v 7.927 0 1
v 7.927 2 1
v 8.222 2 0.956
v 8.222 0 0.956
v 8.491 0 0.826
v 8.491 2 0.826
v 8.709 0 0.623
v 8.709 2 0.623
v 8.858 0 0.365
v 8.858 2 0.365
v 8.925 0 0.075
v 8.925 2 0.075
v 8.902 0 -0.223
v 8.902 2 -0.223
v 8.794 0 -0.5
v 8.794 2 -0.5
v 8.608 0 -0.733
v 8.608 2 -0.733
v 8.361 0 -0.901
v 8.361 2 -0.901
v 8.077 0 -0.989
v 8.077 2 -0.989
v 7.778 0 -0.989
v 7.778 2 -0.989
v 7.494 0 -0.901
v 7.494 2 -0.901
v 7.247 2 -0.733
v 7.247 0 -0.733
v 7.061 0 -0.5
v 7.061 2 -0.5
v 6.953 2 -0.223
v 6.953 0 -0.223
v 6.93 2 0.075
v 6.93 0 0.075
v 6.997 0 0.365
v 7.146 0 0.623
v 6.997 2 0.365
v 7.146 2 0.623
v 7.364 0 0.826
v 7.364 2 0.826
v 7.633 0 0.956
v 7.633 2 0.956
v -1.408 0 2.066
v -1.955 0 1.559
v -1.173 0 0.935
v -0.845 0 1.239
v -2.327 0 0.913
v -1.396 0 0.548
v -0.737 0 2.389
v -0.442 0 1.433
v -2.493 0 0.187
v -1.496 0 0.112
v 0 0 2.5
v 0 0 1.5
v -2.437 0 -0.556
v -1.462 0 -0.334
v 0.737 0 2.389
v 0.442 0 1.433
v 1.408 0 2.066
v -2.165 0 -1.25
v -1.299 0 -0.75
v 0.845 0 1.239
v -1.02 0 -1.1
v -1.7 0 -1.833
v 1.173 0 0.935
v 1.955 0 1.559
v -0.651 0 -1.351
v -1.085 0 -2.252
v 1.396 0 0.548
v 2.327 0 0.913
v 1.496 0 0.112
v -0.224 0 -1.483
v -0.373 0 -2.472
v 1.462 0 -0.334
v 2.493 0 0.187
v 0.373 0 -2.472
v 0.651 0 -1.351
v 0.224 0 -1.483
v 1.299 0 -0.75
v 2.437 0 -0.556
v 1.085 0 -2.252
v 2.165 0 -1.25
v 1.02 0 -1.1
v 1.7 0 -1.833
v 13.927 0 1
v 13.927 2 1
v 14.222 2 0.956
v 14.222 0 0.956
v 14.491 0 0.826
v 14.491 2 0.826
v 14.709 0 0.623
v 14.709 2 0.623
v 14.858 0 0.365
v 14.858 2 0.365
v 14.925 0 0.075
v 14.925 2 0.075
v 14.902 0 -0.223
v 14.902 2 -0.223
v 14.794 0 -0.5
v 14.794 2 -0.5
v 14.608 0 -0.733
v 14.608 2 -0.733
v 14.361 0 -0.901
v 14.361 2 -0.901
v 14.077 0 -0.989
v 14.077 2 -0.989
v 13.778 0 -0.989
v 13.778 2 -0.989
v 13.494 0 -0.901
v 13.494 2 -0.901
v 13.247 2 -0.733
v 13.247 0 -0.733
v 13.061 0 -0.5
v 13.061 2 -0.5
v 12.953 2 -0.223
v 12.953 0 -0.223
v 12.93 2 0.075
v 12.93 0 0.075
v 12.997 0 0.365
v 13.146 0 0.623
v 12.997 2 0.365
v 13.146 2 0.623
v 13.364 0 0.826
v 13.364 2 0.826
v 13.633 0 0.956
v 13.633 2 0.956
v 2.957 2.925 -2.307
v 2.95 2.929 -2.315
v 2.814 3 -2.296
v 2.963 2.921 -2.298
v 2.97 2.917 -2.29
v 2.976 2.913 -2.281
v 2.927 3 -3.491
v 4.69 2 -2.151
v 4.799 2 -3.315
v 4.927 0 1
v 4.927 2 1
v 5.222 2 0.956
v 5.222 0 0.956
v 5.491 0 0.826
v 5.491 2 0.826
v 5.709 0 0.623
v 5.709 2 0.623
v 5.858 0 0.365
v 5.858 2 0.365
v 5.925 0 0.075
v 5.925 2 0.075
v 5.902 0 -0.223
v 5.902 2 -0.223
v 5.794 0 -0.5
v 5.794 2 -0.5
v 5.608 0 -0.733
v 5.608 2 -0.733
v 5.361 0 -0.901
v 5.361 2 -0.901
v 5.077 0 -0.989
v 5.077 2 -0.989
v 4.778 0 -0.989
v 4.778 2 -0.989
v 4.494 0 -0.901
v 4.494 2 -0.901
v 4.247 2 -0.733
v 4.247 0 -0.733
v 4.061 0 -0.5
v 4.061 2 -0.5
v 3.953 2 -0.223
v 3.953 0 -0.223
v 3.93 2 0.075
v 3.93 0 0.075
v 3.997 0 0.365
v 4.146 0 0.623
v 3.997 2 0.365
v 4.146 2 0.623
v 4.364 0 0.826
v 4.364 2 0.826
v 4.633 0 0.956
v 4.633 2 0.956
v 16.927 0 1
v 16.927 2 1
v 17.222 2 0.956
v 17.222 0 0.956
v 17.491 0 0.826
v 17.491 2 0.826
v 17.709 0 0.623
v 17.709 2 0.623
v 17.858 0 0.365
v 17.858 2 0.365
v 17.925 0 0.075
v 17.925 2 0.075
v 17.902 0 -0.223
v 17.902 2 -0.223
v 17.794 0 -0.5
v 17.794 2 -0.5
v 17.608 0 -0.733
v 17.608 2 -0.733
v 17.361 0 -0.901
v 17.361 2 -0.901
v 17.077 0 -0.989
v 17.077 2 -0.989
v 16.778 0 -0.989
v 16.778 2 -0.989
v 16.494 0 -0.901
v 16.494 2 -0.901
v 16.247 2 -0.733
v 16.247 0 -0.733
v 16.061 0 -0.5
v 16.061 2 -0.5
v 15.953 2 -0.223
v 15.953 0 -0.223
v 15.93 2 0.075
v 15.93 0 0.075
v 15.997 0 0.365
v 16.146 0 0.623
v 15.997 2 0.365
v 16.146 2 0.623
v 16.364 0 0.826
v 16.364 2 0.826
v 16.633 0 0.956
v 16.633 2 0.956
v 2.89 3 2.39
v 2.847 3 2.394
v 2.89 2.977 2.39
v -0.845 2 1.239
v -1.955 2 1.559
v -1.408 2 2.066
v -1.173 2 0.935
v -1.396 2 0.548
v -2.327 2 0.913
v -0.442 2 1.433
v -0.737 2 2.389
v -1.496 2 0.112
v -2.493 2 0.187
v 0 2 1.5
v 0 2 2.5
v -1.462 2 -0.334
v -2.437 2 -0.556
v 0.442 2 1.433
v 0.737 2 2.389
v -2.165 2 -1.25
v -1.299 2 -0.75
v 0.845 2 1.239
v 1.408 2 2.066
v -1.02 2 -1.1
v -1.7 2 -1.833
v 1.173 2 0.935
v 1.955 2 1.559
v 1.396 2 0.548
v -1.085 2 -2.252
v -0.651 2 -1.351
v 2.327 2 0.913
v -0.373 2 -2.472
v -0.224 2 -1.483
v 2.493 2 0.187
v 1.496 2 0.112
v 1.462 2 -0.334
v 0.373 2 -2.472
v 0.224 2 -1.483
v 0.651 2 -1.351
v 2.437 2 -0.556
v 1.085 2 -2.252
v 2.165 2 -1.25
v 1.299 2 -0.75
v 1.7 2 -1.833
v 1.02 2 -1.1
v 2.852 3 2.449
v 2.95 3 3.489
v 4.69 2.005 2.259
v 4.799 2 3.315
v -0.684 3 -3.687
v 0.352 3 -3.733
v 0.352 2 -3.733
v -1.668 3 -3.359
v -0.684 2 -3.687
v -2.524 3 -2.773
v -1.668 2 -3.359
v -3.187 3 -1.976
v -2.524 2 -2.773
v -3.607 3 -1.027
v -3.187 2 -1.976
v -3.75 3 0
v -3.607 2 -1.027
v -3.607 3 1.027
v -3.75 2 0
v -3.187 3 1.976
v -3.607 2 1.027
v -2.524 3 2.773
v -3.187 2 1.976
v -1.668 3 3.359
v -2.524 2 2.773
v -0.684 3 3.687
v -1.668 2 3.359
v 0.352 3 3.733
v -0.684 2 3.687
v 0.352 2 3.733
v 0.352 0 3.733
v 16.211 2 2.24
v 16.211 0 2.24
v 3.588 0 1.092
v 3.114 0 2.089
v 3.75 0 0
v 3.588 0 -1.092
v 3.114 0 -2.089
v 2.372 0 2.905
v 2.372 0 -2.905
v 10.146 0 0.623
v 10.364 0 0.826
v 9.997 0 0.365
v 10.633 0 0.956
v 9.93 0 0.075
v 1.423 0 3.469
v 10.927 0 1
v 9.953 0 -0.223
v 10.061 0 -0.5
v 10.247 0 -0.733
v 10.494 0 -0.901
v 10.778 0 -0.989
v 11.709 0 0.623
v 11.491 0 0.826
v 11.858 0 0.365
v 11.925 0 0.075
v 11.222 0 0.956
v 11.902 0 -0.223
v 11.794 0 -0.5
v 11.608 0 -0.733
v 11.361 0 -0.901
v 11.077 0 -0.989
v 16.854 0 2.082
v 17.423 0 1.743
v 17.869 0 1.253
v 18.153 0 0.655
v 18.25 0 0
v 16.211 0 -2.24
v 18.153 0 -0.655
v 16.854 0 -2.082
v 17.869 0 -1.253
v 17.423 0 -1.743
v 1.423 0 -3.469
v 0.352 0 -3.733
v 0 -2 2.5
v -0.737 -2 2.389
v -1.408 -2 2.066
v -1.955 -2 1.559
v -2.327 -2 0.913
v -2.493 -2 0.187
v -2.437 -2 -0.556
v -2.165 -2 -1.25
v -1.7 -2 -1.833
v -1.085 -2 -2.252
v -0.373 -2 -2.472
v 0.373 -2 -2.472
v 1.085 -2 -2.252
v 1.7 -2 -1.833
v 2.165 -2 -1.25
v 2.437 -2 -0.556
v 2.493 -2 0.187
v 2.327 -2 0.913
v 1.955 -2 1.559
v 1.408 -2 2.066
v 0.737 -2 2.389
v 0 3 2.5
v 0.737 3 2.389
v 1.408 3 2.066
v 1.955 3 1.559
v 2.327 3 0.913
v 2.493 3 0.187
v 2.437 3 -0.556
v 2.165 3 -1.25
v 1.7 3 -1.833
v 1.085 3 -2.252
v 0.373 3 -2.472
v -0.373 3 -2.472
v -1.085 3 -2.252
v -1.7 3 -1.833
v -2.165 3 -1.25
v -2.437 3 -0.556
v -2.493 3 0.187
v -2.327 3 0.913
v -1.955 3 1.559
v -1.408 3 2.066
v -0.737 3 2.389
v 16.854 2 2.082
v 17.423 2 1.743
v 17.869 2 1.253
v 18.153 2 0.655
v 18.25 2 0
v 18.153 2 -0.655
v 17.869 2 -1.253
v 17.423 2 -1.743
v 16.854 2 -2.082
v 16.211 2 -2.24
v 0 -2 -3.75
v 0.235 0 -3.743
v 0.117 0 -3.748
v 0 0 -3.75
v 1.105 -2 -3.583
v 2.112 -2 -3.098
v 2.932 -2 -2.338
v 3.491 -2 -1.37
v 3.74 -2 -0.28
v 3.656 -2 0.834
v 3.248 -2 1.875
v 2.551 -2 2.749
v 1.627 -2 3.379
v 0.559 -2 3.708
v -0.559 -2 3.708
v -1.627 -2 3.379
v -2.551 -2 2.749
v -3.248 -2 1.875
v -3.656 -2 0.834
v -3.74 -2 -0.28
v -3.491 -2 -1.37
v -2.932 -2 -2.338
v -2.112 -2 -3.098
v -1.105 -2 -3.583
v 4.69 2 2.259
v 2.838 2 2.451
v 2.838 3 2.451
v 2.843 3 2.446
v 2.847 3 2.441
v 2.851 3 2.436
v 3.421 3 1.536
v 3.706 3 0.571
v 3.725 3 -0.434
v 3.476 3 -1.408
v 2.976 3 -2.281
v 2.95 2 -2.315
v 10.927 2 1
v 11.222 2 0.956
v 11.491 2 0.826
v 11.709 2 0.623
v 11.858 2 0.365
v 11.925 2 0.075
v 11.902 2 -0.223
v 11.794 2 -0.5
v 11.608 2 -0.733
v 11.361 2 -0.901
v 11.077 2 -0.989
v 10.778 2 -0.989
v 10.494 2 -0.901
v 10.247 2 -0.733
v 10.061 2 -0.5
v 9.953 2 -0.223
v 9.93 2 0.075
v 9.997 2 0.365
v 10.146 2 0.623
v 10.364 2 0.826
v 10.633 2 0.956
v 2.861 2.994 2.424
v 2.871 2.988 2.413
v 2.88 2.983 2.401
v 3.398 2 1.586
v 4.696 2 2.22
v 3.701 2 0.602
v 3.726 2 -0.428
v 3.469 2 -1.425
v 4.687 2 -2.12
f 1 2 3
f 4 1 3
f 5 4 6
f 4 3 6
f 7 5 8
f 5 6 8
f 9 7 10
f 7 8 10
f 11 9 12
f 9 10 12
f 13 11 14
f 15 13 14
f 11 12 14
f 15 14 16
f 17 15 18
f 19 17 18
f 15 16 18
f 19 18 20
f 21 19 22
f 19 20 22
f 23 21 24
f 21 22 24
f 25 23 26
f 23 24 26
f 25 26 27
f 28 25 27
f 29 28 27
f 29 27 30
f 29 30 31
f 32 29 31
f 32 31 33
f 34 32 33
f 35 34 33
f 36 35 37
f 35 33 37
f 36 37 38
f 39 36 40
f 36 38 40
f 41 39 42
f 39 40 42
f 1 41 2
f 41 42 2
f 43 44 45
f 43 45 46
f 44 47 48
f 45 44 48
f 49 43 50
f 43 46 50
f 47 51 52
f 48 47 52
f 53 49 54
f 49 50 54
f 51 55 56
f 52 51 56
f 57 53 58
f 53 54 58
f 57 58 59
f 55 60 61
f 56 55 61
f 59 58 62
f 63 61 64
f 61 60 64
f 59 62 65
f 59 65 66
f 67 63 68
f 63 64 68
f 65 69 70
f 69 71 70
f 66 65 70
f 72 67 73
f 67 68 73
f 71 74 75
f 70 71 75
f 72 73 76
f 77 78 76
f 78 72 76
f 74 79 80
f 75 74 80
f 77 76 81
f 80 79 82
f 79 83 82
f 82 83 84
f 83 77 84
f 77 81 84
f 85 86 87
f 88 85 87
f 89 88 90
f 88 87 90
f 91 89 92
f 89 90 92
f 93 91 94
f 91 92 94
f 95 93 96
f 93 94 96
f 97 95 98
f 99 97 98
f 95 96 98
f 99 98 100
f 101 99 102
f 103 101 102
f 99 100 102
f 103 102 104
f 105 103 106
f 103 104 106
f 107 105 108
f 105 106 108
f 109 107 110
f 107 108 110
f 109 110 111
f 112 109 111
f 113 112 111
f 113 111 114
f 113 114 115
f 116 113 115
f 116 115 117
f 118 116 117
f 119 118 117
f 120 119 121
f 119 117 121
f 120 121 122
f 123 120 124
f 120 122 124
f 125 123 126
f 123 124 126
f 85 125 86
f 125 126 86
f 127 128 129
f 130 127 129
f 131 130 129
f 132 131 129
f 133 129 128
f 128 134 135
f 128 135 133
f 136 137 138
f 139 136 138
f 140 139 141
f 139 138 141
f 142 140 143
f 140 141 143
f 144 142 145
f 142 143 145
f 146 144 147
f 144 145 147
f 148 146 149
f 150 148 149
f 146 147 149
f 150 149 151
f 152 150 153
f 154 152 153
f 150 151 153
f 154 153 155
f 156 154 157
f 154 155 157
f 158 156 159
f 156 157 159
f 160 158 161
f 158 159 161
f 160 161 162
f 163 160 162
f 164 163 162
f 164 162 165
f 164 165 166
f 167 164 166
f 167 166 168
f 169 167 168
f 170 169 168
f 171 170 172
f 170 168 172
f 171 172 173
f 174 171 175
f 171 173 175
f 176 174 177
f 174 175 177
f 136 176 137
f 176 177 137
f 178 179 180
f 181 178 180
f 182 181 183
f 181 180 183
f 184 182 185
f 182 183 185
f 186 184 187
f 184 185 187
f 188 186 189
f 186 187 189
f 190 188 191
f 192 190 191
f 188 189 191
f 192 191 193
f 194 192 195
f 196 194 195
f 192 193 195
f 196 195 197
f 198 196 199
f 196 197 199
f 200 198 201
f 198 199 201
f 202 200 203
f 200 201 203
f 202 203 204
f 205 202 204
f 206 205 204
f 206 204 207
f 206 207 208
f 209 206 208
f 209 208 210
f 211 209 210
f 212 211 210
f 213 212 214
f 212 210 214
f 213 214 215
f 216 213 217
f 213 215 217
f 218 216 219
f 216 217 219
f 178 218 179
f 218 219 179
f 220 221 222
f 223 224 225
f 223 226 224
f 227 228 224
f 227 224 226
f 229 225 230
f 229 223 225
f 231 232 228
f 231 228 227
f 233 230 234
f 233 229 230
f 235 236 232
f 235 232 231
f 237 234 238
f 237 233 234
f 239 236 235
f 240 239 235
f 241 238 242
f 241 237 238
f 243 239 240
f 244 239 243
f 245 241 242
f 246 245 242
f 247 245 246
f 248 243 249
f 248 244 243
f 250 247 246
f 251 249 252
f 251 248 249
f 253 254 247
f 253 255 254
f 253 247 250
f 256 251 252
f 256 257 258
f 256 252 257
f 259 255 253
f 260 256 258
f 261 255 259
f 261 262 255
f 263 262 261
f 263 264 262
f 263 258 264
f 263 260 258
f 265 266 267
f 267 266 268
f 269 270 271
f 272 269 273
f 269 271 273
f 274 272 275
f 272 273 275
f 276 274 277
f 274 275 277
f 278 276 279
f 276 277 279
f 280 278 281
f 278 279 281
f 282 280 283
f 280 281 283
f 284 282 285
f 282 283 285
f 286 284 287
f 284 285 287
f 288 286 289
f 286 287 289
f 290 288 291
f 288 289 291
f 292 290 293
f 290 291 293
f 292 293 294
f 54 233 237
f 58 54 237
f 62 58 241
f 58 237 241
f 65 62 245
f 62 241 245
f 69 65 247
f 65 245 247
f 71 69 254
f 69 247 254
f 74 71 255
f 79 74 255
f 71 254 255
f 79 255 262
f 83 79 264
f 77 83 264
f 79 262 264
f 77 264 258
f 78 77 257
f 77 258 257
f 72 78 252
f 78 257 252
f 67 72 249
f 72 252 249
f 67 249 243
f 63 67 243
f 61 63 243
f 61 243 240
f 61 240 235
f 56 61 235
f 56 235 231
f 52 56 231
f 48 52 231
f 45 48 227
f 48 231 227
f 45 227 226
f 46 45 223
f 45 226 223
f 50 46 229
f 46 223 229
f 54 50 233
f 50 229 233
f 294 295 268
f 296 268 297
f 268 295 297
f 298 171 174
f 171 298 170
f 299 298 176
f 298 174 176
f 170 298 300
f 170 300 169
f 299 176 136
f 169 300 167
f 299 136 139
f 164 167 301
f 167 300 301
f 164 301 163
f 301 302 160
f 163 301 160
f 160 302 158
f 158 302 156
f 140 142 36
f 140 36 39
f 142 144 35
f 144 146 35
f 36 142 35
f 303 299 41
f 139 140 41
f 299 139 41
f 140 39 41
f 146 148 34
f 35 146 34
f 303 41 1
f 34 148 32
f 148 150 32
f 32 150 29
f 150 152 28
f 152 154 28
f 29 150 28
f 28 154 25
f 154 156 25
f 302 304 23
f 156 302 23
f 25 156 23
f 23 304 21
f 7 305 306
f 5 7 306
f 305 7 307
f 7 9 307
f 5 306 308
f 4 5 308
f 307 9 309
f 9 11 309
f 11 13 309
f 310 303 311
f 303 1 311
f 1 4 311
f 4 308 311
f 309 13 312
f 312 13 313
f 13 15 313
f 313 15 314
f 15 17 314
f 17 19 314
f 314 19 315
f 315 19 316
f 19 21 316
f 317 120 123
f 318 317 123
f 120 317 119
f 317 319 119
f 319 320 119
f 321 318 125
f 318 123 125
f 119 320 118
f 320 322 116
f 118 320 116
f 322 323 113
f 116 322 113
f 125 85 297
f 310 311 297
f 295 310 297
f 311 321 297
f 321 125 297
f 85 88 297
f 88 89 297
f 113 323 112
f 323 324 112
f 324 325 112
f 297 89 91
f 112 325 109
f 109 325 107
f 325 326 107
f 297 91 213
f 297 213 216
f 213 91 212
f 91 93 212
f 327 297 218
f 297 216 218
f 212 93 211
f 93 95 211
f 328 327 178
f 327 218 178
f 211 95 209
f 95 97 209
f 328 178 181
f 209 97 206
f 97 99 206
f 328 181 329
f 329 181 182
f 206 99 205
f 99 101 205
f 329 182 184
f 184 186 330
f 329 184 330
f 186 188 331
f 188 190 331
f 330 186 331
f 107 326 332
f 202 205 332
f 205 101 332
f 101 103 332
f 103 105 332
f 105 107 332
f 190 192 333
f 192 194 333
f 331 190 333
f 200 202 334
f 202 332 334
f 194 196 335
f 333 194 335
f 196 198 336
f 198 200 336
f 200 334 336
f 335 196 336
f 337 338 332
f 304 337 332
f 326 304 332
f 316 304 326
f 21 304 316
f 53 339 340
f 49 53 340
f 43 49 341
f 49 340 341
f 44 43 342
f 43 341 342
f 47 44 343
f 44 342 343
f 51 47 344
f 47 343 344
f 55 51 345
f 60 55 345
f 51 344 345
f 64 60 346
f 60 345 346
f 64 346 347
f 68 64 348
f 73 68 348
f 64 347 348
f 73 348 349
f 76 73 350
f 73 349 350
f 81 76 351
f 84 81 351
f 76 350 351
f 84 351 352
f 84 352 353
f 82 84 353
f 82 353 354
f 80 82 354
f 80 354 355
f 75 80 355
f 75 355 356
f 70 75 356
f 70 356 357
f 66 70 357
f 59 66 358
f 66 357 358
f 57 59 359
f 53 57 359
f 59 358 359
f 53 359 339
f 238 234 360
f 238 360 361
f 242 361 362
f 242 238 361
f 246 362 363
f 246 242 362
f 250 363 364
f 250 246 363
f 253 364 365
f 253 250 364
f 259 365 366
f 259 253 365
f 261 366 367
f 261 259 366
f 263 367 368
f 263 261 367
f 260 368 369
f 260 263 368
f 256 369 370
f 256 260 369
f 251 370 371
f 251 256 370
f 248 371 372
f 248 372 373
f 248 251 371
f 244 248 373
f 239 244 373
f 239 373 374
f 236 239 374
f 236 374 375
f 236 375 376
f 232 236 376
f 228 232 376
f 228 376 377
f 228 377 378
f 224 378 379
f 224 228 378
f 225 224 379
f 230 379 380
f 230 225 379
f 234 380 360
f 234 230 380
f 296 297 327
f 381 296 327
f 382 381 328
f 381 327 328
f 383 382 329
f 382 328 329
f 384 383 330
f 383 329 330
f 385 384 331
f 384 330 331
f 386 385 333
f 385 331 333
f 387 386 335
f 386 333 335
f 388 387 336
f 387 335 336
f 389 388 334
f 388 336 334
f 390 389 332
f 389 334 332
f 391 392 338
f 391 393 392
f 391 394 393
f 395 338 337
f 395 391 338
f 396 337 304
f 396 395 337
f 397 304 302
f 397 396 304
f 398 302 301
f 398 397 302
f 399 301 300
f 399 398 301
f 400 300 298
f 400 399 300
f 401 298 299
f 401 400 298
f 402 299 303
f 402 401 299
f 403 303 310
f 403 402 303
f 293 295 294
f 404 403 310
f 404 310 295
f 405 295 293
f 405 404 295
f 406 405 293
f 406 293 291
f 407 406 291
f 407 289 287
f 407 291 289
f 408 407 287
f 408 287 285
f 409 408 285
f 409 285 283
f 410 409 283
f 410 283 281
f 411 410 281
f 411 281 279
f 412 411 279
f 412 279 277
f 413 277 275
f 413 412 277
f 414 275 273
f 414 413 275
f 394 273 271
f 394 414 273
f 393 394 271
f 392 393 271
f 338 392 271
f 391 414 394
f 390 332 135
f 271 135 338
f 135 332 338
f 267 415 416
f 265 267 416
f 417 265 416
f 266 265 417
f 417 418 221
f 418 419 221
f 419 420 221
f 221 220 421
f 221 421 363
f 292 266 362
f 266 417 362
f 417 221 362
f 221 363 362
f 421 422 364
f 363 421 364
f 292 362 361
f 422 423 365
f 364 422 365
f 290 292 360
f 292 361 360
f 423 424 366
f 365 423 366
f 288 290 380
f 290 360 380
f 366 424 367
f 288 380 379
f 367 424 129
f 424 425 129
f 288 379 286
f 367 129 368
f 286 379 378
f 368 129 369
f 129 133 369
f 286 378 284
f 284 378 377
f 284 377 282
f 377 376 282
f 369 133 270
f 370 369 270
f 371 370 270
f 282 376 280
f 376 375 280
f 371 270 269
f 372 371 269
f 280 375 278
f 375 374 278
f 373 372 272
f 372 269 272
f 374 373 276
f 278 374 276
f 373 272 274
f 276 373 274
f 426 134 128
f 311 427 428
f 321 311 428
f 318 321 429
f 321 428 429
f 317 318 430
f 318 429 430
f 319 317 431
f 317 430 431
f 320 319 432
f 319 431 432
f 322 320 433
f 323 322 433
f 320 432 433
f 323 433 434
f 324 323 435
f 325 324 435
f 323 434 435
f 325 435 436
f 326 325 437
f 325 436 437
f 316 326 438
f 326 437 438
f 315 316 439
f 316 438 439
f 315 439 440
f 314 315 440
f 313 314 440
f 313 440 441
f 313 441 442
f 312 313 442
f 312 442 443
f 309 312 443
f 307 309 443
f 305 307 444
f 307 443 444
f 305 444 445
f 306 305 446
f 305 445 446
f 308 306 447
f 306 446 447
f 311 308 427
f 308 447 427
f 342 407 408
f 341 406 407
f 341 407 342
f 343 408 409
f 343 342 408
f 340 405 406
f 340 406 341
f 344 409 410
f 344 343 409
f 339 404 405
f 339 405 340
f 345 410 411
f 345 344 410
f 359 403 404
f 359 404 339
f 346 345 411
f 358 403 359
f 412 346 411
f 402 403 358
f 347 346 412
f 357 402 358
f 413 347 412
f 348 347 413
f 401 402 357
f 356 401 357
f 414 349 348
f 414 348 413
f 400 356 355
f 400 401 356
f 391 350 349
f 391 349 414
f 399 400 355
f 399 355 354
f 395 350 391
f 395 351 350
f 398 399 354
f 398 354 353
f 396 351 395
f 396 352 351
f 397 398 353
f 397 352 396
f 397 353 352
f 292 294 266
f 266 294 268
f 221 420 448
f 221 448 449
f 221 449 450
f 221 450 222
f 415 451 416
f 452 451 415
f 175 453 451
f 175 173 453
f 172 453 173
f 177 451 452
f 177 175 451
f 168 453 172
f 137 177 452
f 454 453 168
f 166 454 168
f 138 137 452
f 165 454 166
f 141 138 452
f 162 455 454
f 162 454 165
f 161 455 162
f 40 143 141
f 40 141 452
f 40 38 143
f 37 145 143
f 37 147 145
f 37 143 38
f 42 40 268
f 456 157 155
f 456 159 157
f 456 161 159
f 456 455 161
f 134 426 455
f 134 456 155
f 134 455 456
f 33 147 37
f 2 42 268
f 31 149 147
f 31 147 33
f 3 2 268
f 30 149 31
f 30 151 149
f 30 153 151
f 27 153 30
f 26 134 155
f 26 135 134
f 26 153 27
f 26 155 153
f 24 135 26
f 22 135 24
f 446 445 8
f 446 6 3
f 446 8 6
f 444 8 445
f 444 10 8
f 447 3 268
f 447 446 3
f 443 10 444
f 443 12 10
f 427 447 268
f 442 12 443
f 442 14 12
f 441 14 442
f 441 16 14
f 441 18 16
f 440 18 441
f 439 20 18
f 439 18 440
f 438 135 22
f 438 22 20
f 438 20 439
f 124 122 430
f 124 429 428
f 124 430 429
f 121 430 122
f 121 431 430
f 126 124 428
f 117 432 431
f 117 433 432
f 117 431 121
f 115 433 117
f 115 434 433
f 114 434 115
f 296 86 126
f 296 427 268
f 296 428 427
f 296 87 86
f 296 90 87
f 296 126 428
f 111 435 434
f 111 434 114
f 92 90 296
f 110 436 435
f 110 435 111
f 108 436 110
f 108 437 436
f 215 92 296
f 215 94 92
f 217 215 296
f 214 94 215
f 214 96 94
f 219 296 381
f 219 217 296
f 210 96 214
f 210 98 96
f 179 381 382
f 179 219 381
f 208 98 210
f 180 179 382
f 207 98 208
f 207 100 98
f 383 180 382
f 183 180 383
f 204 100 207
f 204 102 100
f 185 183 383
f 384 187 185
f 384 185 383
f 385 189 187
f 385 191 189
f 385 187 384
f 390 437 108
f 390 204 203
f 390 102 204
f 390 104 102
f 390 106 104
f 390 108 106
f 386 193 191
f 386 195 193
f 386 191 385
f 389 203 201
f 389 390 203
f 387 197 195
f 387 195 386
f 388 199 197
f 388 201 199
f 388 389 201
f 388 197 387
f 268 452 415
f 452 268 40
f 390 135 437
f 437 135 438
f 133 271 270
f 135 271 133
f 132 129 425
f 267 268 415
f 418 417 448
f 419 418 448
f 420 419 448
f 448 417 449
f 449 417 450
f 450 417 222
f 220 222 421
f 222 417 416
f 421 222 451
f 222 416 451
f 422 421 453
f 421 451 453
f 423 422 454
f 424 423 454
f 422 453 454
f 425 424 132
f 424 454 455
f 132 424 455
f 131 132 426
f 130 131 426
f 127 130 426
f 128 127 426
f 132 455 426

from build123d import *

# Parameters (mm, degrees)
SKETCH_1_R          = 3.75
SKETCH_1_R_2        = 2.25
EXTRUDE_1_DEPTH     = 2
SKETCH_2_R          = 3.75
SKETCH_2_R_2        = 2.5
EXTRUDE_2_DEPTH     = 1
EXTRUDE_START       = 2
SKETCH_3_R          = 3.75
SKETCH_3_R_2        = 2.5
EXTRUDE_3_DEPTH     = 2
SKETCH_4_R          = 1.5
SKETCH_4_R_2        = 1
CUT_EXTRUDE_1_DEPTH = 2
EXTRUDE_4_DEPTH     = 1
CUT_EXTRUDE_2_DEPTH = 1.1
CUT_EXTRUDE_4_DEPTH = 1.2


with BuildPart() as part:
    # 草图1 → 凸台-拉伸1 (new body)
    with BuildSketch(Plane(origin=(0, 0, 0), x_dir=(1, 0, 0), z_dir=(0, 1, 0))):
        Circle(SKETCH_1_R)
        with BuildLine():
            Line((16.2109375, 2.240090483), (0.3515625, 3.733484138))
            ThreePointArc((0.3515625, 3.733484138), (2.773162398, 2.524296003), (3.75, 0))
            ThreePointArc((3.75, 0), (2.773162398, -2.524296003), (0.3515625, -3.733484138))
            Line((0.3515625, -3.733484138), (16.2109375, -2.240090483))
            ThreePointArc((16.2109375, -2.240090483), (13.75, 0), (16.2109375, 2.240090483))
        make_face()
        with Locations((16, 0)):
            Circle(SKETCH_1_R_2)
    extrude(amount=EXTRUDE_1_DEPTH)

    # 草图2 → 凸台-拉伸2 (add)
    with BuildSketch(Plane(origin=(0, 2, 0), x_dir=(1, 0, 0), z_dir=(0, 1, 0))):
        with Locations(Location((0, 0, 0), (0, 0, 84.620621009))):
            Circle(SKETCH_2_R)
        with Locations(Location((0, 0, 0), (0, 0, 270))):
            Circle(SKETCH_2_R_2, mode=Mode.SUBTRACT)
    extrude(amount=EXTRUDE_2_DEPTH)

    # 草图3 → 凸台-拉伸3 (add)
    with BuildSketch(Plane.XZ.offset(EXTRUDE_START)):
        with Locations(Location((0, 0, 0), (0, 0, 270))):
            Circle(SKETCH_3_R)
        with Locations(Location((0, 0, 0), (0, 0, 90))):
            Circle(SKETCH_3_R_2, mode=Mode.SUBTRACT)
    extrude(amount=-EXTRUDE_3_DEPTH)

    # 草图4 → 切除-拉伸1 (cut)
    with BuildSketch(Plane(origin=(0, 2, 0), x_dir=(1, 0, 0), z_dir=(0, 1, 0))):
        with Locations(Location((0, 0, 0), (0, 0, 270))):
            Circle(SKETCH_4_R)
        with Locations(Location((4.92748738, 0, 0), (0, 0, 270))):
            Circle(SKETCH_4_R_2)
        with Locations(Location((7.92748738, 0, 0), (0, 0, 270))):
            Circle(SKETCH_4_R_2)
        with Locations(Location((10.92748738, 0, 0), (0, 0, 270))):
            Circle(SKETCH_4_R_2)
        with Locations(Location((13.92748738, 0, 0), (0, 0, 270))):
            Circle(SKETCH_4_R_2)
        with Locations(Location((16.92748738, 0, 0), (0, 0, 270))):
            Circle(SKETCH_4_R_2)
    extrude(amount=-CUT_EXTRUDE_1_DEPTH, mode=Mode.SUBTRACT)

    # 草图5 → 凸台-拉伸4 (add)
    with BuildSketch(Plane(origin=(0, 2, 0), x_dir=(1, 0, 0), z_dir=(0, 1, 0))):
        with BuildLine():
            Line((0.3515625, 3.733484138), (4.799205036, 3.31467311))
            Line((4.799205036, 3.31467311), (4.689652743, 2.151261914))
            Line((4.689652743, 2.151261914), (2.950077578, 2.315068527))
            ThreePointArc((2.950077578, 2.315068527), (1.796714366, 3.291552444), (0.3515625, 3.733484138))
        make_face()
        with BuildLine():
            Line((0.3515625, -3.733484138), (4.799205036, -3.31467311))
            Line((4.799205036, -3.31467311), (4.689652743, -2.258798299))
            Line((4.689652743, -2.258798299), (2.838244627, -2.450891151))
            ThreePointArc((2.838244627, -2.450891151), (1.71900511, -3.332794838), (0.3515625, -3.733484138))
        make_face()
    extrude(amount=EXTRUDE_4_DEPTH)

    # 草图6 → 切除-拉伸2 (cut)
    with BuildSketch(Plane(origin=(0.3515625, 0, 3.733484138), x_dir=(0.9955957701296245, 0, -0.09374999999999994), z_dir=(0.09374999999999994, 0, 0.9955957701296245))):
        Polygon((2.610250593, 3), (4.46731763, 2), (4.46731763, 3), align=None)
    extrude(amount=-CUT_EXTRUDE_2_DEPTH, mode=Mode.SUBTRACT)

    # 草图7 → 切除-拉伸4 (cut)
    with BuildSketch(Plane(origin=(0.3515625, 0, -3.733484138), x_dir=(-0.9955957701296245, 0, -0.09375), z_dir=(0.09375, 0, -0.9955957701296245))):
        Polygon((-2.586419937, 3), (-4.46731763, 2), (-4.46731763, 3), align=None)
    extrude(amount=-CUT_EXTRUDE_4_DEPTH, mode=Mode.SUBTRACT)


solid = part.part
